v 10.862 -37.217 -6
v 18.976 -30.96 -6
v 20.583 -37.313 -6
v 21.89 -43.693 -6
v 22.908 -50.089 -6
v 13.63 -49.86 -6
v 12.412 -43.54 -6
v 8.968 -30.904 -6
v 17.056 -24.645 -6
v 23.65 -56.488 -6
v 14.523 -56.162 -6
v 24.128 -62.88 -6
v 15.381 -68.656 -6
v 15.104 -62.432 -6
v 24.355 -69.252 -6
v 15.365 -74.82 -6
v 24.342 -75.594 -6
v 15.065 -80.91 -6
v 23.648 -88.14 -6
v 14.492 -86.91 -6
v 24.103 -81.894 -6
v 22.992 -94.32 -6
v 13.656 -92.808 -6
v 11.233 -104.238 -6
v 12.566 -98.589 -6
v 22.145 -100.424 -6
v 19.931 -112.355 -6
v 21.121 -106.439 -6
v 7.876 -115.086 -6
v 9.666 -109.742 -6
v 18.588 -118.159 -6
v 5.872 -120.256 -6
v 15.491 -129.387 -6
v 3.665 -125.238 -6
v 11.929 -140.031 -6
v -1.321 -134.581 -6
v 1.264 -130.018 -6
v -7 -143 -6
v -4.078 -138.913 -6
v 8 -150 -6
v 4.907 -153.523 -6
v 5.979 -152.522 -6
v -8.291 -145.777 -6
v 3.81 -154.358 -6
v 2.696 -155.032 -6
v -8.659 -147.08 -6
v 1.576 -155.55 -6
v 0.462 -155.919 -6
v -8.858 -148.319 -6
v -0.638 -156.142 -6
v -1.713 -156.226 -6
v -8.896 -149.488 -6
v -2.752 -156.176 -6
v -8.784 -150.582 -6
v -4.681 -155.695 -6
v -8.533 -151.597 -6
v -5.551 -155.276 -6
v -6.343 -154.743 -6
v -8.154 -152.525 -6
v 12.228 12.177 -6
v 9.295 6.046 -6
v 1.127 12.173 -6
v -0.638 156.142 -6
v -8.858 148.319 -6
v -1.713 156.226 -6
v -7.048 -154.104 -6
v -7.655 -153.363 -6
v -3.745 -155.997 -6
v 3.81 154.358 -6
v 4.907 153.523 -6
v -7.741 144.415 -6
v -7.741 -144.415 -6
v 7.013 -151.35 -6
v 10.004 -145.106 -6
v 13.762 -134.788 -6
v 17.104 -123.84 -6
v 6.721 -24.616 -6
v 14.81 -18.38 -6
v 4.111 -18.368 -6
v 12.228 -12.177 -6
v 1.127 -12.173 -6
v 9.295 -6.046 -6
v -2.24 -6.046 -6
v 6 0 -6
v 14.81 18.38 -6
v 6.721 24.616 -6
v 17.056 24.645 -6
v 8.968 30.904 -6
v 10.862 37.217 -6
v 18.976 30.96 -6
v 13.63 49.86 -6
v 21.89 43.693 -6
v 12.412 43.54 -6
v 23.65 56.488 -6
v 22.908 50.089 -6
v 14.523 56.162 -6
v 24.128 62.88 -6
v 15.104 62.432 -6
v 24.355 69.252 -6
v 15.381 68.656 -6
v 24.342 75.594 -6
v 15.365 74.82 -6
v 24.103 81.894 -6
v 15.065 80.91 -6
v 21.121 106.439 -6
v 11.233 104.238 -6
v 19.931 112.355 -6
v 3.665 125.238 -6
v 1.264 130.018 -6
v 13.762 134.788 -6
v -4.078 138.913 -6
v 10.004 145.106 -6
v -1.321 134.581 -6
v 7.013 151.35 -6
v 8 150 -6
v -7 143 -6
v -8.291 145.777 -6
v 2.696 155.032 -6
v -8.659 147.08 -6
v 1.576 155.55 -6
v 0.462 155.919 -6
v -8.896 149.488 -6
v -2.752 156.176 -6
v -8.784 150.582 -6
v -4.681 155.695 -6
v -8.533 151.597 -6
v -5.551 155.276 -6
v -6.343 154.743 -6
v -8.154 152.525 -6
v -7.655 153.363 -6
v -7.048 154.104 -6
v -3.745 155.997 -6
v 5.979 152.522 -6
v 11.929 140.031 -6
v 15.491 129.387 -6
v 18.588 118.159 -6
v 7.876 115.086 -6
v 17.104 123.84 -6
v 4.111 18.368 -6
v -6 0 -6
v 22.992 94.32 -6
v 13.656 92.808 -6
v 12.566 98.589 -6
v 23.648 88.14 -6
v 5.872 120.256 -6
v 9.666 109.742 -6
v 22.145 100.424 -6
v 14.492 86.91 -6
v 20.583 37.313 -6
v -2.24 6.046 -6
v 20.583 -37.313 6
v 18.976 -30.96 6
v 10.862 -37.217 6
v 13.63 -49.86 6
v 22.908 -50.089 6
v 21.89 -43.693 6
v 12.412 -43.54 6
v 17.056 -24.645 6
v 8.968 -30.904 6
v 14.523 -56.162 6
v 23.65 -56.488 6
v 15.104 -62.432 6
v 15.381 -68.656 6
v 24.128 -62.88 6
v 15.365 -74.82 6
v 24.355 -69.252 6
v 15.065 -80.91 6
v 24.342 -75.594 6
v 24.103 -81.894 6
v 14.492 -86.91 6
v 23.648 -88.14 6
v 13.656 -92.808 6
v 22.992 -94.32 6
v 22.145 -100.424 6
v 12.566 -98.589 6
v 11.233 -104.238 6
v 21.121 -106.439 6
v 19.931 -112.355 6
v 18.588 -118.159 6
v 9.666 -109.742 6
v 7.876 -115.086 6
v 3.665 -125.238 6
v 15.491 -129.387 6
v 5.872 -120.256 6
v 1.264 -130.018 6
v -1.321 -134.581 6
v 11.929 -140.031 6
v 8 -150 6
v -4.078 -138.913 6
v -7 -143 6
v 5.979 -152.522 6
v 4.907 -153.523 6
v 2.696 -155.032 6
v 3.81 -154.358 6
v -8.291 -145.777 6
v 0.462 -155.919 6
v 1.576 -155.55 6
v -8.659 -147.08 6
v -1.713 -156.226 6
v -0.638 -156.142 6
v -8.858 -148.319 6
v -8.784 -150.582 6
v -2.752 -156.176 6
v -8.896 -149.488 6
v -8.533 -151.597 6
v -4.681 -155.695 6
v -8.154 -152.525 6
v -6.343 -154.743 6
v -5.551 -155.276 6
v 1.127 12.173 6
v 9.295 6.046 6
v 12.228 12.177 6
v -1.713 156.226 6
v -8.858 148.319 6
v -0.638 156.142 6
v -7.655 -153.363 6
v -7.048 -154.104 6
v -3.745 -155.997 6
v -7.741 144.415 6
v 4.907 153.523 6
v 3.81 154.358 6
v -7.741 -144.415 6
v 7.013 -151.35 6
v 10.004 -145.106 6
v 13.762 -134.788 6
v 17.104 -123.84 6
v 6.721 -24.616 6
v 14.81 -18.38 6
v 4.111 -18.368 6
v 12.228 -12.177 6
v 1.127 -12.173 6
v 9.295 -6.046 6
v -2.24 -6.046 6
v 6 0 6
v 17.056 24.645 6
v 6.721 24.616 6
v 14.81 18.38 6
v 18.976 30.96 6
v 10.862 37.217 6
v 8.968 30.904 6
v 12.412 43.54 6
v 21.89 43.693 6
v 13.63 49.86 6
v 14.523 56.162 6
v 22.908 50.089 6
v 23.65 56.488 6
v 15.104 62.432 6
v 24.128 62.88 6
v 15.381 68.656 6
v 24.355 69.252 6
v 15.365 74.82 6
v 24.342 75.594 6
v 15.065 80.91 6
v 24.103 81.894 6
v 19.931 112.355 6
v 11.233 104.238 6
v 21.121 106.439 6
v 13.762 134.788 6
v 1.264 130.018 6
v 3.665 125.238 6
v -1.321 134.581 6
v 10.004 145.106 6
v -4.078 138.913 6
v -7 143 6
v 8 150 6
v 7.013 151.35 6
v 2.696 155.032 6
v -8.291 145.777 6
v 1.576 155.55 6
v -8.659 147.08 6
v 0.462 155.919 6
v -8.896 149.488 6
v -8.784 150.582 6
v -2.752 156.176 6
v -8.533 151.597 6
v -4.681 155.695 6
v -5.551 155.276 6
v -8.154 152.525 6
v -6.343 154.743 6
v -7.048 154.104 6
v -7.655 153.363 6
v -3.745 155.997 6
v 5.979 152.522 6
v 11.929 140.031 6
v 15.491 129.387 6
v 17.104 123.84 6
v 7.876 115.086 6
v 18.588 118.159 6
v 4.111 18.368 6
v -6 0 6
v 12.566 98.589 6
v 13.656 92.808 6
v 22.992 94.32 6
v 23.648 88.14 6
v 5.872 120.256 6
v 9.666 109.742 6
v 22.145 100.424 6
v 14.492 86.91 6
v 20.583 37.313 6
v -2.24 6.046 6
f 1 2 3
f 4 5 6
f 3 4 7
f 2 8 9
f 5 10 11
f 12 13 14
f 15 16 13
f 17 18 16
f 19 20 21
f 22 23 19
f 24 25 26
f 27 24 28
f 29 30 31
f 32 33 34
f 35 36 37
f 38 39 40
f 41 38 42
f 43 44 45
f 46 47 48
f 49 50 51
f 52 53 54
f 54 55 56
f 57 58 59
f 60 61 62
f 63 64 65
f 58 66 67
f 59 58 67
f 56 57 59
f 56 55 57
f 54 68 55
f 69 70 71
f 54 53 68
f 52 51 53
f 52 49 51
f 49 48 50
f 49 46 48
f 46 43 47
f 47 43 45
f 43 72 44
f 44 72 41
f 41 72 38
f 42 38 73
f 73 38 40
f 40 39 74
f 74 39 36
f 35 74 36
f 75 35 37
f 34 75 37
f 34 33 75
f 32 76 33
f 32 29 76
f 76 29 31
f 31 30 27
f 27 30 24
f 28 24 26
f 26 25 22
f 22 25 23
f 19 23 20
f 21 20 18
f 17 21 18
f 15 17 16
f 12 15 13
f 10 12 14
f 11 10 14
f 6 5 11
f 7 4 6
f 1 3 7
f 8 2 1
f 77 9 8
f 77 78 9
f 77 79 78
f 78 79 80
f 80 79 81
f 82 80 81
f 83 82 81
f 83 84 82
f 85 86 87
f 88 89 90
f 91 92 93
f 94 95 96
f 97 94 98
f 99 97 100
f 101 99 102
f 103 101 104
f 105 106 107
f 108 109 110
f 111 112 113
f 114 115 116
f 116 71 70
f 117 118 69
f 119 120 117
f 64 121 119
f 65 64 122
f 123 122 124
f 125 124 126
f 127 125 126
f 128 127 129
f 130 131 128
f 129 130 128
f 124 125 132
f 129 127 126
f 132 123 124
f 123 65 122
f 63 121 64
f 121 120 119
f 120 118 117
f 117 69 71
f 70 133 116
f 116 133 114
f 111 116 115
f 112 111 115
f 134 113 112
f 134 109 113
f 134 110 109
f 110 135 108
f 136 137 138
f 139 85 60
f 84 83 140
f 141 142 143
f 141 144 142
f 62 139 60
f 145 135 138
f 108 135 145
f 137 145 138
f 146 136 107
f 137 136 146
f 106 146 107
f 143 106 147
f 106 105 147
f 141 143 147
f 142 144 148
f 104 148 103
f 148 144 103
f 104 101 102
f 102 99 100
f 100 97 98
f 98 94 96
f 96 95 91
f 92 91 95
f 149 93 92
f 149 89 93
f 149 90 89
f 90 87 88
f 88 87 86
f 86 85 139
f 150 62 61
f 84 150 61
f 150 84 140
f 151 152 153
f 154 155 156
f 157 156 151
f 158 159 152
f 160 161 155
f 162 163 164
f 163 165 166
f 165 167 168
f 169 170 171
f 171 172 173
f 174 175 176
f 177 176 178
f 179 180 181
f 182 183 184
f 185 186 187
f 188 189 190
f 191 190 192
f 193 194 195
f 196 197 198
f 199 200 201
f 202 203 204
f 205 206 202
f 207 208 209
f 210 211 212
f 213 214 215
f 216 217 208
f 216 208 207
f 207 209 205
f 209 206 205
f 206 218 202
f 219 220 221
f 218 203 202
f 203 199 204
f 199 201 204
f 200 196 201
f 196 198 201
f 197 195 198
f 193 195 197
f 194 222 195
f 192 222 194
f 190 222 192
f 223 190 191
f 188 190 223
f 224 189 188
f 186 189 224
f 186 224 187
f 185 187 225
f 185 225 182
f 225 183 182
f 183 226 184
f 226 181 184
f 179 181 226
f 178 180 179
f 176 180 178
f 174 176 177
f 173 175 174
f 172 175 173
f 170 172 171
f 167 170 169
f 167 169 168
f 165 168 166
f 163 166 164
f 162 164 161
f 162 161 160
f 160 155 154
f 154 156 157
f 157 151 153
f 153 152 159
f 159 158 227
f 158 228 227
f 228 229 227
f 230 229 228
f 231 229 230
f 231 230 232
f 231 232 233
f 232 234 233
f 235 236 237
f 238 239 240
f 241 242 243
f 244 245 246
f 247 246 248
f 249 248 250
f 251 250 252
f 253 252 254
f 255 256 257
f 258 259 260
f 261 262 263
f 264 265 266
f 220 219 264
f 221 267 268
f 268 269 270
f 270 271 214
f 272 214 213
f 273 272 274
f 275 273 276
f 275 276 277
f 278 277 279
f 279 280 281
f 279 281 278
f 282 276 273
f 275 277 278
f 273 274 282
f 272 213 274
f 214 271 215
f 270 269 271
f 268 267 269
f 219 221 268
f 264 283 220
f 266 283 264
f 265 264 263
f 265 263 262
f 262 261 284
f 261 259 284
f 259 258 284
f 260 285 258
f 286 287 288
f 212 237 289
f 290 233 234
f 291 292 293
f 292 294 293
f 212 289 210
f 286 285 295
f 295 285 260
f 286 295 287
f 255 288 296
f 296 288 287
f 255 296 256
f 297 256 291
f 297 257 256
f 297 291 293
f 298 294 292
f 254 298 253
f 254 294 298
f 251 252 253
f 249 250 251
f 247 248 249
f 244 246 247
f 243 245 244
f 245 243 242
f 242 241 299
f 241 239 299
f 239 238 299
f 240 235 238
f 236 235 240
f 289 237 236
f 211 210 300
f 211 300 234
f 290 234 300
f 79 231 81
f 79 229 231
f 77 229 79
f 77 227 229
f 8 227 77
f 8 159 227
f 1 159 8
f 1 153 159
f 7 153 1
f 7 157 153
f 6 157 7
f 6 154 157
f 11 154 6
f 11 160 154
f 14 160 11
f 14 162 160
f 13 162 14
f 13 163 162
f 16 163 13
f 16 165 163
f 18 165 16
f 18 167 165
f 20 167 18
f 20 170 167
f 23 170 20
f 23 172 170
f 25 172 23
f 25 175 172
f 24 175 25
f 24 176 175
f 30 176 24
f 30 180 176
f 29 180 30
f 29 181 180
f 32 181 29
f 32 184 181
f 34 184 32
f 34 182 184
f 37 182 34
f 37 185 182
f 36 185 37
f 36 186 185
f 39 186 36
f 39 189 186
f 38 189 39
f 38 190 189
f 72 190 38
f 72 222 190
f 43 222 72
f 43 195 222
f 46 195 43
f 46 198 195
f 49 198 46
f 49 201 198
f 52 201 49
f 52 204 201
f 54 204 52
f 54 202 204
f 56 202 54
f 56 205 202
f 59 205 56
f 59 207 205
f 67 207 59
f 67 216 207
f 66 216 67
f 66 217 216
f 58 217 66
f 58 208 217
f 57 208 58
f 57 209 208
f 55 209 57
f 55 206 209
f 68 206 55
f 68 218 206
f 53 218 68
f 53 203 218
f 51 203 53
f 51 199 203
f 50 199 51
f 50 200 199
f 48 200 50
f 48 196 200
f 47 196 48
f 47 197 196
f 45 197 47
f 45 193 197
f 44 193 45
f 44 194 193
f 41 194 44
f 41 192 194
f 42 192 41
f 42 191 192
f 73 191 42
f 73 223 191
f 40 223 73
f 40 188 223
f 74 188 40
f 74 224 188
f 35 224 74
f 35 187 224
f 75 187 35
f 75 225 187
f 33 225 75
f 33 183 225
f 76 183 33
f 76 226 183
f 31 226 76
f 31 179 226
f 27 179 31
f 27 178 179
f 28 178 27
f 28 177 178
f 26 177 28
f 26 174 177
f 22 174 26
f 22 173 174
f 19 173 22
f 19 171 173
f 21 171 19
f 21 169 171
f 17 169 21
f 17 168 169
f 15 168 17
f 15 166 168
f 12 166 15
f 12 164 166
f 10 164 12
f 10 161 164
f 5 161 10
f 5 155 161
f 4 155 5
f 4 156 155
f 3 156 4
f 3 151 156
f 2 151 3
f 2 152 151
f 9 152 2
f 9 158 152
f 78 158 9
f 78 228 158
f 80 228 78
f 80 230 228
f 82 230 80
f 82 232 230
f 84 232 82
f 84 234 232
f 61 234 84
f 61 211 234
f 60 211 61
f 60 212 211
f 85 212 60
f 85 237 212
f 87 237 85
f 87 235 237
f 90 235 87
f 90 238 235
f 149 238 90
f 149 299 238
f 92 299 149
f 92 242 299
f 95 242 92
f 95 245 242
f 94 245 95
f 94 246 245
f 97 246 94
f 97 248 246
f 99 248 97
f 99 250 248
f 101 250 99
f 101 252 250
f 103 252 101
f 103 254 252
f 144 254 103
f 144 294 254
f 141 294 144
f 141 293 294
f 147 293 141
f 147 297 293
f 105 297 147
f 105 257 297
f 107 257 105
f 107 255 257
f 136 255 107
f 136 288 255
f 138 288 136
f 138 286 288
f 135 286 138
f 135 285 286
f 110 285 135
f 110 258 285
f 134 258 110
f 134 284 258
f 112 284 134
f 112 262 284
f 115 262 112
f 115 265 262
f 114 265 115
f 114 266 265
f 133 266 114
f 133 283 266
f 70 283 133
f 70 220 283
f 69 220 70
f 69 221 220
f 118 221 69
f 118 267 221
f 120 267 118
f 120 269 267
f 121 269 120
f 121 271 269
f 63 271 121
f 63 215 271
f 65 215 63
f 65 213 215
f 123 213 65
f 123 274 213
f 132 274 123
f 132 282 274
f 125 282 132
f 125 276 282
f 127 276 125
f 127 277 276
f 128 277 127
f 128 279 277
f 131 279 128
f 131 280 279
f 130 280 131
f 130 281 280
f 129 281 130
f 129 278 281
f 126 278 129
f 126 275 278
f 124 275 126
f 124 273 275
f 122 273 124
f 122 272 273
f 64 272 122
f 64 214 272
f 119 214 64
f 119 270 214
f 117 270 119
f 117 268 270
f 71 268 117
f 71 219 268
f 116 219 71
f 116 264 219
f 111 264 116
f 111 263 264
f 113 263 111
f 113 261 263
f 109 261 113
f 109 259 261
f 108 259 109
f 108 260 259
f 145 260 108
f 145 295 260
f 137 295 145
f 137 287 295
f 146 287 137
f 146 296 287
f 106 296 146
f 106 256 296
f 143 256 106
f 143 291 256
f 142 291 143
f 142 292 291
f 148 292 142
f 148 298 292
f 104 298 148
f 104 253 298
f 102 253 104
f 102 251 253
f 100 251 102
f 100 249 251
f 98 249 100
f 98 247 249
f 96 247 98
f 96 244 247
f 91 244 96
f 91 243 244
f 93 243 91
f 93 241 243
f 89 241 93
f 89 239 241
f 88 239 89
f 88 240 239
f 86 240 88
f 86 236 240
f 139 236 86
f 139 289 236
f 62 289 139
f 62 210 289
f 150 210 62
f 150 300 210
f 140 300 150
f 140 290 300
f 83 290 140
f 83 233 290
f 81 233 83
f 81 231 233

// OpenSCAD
// ==================================================
// 3D Extruded Bow using Cubic Bézier Curves
// ==================================================

// --- Parameters ---
extrusion_height = 12; // Height/thickness of flat faces (Z-axis)
steps            = 25; // Number of interpolation steps per curve segment

// --- Cubic Bézier Math Helper ---
function bezier_cubic(p0, p1, p2, p3, t) =
    pow(1 - t, 3) * p0 +
    3 * pow(1 - t, 2) * t * p1 +
    3 * (1 - t) * pow(t, 2) * p2 +
    pow(t, 3) * p3;

function generate_curve(p0, p1, p2, p3, n) =
    [ for (i = [0 : n]) bezier_cubic(p0, p1, p2, p3, i / n) ];

// --- Control Points (Top Limb: [X = Depth/Curve, Y = Length]) ---

// 1. Outer Edge (Back of the bow)
p_out0 = [6, 0];       // Outer center handle
p_out1 = [35, 50];     // Main arch curve outwards
p_out2 = [25, 110];    // Upper limb tapering back
p_out3 = [8, 150];     // Tip base

// 2. Hook / Recurve Tip
p_hk0  = [8, 150];
p_hk1  = [0, 162];     // Curve around tip end
p_hk2  = [-14, 155];   // Hook curl back down
p_hk3  = [-7, 143];    // Inner tip junction

// 3. Inner Edge (Belly of the bow)
p_in0  = [-7, 143];
p_in1  = [18, 110];    // Inner limb profile
p_in2  = [27, 50];     // Inner grip swell
p_in3  = [-6, 0];      // Inner center handle

// --- Generate 2D Profile ---
pts_outer = generate_curve(p_out0, p_out1, p_out2, p_out3, steps);
pts_hook  = generate_curve(p_hk0, p_hk1, p_hk2, p_hk3, steps);
pts_inner = generate_curve(p_in0, p_in1, p_in2, p_in3, steps);

// Stitch point sets into a single loop for half the bow
half_bow_polygon = concat(pts_outer, pts_hook, pts_inner);

// --- Modules ---
module half_bow_2d() {
    polygon(points = half_bow_polygon);
}

module full_bow_3d() {
    linear_extrude(height = extrusion_height, center = true) {
        union() {
            half_bow_2d();
            mirror([0, 1, 0]) half_bow_2d(); // Mirror along Y-axis for bottom limb
        }
    }
}

// --- Render Model ---
full_bow_3d();
